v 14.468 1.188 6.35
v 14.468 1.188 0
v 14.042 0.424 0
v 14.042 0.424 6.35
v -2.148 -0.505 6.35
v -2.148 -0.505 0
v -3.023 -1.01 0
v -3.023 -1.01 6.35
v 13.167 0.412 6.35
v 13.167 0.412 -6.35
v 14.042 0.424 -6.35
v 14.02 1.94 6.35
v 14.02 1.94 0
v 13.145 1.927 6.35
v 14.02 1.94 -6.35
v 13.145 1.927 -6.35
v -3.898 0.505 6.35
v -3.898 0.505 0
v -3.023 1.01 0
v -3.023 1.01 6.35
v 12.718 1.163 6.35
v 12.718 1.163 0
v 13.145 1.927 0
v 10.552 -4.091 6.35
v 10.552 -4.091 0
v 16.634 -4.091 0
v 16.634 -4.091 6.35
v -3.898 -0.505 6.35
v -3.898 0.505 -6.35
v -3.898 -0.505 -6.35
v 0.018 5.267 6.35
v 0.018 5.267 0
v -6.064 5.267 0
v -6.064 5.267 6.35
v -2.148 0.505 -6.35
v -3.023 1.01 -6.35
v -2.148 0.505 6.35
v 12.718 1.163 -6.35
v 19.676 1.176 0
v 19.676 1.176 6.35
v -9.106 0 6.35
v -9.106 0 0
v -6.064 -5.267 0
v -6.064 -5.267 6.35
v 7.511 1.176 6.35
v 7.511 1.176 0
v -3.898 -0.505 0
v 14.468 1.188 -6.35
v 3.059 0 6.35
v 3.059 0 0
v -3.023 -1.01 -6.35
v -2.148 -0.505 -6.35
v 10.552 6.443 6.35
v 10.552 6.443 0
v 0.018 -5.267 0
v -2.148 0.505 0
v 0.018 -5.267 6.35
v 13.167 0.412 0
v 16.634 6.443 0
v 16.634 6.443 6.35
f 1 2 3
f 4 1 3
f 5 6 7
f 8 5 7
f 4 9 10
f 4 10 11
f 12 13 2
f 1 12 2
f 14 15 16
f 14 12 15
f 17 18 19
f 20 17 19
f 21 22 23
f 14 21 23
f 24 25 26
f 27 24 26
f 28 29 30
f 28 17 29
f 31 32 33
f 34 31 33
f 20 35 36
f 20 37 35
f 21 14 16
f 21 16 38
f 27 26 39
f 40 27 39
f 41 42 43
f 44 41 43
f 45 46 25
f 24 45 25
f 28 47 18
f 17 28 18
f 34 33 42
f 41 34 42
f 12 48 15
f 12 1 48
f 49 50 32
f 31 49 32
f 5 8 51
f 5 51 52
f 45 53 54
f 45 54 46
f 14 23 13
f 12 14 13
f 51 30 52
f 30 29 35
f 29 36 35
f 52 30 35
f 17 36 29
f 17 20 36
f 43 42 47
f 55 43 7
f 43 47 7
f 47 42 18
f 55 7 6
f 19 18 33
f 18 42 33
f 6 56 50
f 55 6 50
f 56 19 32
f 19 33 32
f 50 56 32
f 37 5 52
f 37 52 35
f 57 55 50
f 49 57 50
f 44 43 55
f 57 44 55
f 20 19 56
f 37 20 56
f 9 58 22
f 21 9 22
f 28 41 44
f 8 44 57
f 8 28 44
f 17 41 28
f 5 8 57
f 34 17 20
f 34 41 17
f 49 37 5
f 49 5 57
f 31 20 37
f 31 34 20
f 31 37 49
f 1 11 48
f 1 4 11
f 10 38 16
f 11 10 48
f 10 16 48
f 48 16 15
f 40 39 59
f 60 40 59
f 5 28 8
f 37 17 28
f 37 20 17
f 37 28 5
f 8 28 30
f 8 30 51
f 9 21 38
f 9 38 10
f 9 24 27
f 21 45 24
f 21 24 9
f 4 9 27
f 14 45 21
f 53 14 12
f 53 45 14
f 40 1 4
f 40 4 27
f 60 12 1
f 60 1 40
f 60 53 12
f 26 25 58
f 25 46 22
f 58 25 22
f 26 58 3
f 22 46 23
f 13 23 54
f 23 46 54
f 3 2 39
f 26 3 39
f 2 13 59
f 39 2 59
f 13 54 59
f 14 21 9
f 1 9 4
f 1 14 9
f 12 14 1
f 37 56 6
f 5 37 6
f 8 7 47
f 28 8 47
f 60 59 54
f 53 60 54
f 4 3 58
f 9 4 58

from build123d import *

# Parameters (mm, degrees)
F1_DEPTH      = 6.35
F2_DEPTH      = 6.35
F2_DEPTH_BACK = 6.35


with BuildPart() as f1:
    # F0 (on Top) → F1 (new body)
    with BuildSketch(Plane.XY):
        Polygon((-6.064381, -5.267384), (0.01787, -5.267384), (3.058996, 0), (0.01787, 5.267384), (-6.064381, 5.267384), (-9.105507, 0), align=None)
        Polygon((-3.023256, -1.010363), (-3.898256, -0.505181), (-3.898256, 0.505181), (-3.023256, 1.010363), (-2.148256, 0.505181), (-2.148256, -0.505181), align=None, mode=Mode.SUBTRACT)
        Polygon((10.552234, -4.091467), (16.634486, -4.091467), (19.675611, 1.175917), (16.634486, 6.443302), (10.552234, 6.443302), (7.511108, 1.175917), align=None)
        Polygon((12.718448, 1.163476), (13.145129, 1.927392), (14.020041, 1.939834), (14.468271, 1.188359), (14.04159, 0.424442), (13.166679, 0.412001), align=None, mode=Mode.SUBTRACT)
    extrude(amount=F1_DEPTH)


with BuildPart() as f2:
    # F0 (on Top) → F2 (new body, two sides)
    with BuildSketch(Plane.XY) as f2_sk:
        Polygon((14.020041, 1.939834), (13.145129, 1.927392), (12.718448, 1.163476), (13.166679, 0.412001), (14.04159, 0.424442), (14.468271, 1.188359), align=None)
        Polygon((-3.898256, 0.505181), (-3.898256, -0.505181), (-3.023256, -1.010363), (-2.148256, -0.505181), (-2.148256, 0.505181), (-3.023256, 1.010363), align=None)
    extrude(amount=F2_DEPTH)
    extrude(f2_sk.sketch, amount=-F2_DEPTH_BACK)


solid = Compound([f1.part, f2.part])
